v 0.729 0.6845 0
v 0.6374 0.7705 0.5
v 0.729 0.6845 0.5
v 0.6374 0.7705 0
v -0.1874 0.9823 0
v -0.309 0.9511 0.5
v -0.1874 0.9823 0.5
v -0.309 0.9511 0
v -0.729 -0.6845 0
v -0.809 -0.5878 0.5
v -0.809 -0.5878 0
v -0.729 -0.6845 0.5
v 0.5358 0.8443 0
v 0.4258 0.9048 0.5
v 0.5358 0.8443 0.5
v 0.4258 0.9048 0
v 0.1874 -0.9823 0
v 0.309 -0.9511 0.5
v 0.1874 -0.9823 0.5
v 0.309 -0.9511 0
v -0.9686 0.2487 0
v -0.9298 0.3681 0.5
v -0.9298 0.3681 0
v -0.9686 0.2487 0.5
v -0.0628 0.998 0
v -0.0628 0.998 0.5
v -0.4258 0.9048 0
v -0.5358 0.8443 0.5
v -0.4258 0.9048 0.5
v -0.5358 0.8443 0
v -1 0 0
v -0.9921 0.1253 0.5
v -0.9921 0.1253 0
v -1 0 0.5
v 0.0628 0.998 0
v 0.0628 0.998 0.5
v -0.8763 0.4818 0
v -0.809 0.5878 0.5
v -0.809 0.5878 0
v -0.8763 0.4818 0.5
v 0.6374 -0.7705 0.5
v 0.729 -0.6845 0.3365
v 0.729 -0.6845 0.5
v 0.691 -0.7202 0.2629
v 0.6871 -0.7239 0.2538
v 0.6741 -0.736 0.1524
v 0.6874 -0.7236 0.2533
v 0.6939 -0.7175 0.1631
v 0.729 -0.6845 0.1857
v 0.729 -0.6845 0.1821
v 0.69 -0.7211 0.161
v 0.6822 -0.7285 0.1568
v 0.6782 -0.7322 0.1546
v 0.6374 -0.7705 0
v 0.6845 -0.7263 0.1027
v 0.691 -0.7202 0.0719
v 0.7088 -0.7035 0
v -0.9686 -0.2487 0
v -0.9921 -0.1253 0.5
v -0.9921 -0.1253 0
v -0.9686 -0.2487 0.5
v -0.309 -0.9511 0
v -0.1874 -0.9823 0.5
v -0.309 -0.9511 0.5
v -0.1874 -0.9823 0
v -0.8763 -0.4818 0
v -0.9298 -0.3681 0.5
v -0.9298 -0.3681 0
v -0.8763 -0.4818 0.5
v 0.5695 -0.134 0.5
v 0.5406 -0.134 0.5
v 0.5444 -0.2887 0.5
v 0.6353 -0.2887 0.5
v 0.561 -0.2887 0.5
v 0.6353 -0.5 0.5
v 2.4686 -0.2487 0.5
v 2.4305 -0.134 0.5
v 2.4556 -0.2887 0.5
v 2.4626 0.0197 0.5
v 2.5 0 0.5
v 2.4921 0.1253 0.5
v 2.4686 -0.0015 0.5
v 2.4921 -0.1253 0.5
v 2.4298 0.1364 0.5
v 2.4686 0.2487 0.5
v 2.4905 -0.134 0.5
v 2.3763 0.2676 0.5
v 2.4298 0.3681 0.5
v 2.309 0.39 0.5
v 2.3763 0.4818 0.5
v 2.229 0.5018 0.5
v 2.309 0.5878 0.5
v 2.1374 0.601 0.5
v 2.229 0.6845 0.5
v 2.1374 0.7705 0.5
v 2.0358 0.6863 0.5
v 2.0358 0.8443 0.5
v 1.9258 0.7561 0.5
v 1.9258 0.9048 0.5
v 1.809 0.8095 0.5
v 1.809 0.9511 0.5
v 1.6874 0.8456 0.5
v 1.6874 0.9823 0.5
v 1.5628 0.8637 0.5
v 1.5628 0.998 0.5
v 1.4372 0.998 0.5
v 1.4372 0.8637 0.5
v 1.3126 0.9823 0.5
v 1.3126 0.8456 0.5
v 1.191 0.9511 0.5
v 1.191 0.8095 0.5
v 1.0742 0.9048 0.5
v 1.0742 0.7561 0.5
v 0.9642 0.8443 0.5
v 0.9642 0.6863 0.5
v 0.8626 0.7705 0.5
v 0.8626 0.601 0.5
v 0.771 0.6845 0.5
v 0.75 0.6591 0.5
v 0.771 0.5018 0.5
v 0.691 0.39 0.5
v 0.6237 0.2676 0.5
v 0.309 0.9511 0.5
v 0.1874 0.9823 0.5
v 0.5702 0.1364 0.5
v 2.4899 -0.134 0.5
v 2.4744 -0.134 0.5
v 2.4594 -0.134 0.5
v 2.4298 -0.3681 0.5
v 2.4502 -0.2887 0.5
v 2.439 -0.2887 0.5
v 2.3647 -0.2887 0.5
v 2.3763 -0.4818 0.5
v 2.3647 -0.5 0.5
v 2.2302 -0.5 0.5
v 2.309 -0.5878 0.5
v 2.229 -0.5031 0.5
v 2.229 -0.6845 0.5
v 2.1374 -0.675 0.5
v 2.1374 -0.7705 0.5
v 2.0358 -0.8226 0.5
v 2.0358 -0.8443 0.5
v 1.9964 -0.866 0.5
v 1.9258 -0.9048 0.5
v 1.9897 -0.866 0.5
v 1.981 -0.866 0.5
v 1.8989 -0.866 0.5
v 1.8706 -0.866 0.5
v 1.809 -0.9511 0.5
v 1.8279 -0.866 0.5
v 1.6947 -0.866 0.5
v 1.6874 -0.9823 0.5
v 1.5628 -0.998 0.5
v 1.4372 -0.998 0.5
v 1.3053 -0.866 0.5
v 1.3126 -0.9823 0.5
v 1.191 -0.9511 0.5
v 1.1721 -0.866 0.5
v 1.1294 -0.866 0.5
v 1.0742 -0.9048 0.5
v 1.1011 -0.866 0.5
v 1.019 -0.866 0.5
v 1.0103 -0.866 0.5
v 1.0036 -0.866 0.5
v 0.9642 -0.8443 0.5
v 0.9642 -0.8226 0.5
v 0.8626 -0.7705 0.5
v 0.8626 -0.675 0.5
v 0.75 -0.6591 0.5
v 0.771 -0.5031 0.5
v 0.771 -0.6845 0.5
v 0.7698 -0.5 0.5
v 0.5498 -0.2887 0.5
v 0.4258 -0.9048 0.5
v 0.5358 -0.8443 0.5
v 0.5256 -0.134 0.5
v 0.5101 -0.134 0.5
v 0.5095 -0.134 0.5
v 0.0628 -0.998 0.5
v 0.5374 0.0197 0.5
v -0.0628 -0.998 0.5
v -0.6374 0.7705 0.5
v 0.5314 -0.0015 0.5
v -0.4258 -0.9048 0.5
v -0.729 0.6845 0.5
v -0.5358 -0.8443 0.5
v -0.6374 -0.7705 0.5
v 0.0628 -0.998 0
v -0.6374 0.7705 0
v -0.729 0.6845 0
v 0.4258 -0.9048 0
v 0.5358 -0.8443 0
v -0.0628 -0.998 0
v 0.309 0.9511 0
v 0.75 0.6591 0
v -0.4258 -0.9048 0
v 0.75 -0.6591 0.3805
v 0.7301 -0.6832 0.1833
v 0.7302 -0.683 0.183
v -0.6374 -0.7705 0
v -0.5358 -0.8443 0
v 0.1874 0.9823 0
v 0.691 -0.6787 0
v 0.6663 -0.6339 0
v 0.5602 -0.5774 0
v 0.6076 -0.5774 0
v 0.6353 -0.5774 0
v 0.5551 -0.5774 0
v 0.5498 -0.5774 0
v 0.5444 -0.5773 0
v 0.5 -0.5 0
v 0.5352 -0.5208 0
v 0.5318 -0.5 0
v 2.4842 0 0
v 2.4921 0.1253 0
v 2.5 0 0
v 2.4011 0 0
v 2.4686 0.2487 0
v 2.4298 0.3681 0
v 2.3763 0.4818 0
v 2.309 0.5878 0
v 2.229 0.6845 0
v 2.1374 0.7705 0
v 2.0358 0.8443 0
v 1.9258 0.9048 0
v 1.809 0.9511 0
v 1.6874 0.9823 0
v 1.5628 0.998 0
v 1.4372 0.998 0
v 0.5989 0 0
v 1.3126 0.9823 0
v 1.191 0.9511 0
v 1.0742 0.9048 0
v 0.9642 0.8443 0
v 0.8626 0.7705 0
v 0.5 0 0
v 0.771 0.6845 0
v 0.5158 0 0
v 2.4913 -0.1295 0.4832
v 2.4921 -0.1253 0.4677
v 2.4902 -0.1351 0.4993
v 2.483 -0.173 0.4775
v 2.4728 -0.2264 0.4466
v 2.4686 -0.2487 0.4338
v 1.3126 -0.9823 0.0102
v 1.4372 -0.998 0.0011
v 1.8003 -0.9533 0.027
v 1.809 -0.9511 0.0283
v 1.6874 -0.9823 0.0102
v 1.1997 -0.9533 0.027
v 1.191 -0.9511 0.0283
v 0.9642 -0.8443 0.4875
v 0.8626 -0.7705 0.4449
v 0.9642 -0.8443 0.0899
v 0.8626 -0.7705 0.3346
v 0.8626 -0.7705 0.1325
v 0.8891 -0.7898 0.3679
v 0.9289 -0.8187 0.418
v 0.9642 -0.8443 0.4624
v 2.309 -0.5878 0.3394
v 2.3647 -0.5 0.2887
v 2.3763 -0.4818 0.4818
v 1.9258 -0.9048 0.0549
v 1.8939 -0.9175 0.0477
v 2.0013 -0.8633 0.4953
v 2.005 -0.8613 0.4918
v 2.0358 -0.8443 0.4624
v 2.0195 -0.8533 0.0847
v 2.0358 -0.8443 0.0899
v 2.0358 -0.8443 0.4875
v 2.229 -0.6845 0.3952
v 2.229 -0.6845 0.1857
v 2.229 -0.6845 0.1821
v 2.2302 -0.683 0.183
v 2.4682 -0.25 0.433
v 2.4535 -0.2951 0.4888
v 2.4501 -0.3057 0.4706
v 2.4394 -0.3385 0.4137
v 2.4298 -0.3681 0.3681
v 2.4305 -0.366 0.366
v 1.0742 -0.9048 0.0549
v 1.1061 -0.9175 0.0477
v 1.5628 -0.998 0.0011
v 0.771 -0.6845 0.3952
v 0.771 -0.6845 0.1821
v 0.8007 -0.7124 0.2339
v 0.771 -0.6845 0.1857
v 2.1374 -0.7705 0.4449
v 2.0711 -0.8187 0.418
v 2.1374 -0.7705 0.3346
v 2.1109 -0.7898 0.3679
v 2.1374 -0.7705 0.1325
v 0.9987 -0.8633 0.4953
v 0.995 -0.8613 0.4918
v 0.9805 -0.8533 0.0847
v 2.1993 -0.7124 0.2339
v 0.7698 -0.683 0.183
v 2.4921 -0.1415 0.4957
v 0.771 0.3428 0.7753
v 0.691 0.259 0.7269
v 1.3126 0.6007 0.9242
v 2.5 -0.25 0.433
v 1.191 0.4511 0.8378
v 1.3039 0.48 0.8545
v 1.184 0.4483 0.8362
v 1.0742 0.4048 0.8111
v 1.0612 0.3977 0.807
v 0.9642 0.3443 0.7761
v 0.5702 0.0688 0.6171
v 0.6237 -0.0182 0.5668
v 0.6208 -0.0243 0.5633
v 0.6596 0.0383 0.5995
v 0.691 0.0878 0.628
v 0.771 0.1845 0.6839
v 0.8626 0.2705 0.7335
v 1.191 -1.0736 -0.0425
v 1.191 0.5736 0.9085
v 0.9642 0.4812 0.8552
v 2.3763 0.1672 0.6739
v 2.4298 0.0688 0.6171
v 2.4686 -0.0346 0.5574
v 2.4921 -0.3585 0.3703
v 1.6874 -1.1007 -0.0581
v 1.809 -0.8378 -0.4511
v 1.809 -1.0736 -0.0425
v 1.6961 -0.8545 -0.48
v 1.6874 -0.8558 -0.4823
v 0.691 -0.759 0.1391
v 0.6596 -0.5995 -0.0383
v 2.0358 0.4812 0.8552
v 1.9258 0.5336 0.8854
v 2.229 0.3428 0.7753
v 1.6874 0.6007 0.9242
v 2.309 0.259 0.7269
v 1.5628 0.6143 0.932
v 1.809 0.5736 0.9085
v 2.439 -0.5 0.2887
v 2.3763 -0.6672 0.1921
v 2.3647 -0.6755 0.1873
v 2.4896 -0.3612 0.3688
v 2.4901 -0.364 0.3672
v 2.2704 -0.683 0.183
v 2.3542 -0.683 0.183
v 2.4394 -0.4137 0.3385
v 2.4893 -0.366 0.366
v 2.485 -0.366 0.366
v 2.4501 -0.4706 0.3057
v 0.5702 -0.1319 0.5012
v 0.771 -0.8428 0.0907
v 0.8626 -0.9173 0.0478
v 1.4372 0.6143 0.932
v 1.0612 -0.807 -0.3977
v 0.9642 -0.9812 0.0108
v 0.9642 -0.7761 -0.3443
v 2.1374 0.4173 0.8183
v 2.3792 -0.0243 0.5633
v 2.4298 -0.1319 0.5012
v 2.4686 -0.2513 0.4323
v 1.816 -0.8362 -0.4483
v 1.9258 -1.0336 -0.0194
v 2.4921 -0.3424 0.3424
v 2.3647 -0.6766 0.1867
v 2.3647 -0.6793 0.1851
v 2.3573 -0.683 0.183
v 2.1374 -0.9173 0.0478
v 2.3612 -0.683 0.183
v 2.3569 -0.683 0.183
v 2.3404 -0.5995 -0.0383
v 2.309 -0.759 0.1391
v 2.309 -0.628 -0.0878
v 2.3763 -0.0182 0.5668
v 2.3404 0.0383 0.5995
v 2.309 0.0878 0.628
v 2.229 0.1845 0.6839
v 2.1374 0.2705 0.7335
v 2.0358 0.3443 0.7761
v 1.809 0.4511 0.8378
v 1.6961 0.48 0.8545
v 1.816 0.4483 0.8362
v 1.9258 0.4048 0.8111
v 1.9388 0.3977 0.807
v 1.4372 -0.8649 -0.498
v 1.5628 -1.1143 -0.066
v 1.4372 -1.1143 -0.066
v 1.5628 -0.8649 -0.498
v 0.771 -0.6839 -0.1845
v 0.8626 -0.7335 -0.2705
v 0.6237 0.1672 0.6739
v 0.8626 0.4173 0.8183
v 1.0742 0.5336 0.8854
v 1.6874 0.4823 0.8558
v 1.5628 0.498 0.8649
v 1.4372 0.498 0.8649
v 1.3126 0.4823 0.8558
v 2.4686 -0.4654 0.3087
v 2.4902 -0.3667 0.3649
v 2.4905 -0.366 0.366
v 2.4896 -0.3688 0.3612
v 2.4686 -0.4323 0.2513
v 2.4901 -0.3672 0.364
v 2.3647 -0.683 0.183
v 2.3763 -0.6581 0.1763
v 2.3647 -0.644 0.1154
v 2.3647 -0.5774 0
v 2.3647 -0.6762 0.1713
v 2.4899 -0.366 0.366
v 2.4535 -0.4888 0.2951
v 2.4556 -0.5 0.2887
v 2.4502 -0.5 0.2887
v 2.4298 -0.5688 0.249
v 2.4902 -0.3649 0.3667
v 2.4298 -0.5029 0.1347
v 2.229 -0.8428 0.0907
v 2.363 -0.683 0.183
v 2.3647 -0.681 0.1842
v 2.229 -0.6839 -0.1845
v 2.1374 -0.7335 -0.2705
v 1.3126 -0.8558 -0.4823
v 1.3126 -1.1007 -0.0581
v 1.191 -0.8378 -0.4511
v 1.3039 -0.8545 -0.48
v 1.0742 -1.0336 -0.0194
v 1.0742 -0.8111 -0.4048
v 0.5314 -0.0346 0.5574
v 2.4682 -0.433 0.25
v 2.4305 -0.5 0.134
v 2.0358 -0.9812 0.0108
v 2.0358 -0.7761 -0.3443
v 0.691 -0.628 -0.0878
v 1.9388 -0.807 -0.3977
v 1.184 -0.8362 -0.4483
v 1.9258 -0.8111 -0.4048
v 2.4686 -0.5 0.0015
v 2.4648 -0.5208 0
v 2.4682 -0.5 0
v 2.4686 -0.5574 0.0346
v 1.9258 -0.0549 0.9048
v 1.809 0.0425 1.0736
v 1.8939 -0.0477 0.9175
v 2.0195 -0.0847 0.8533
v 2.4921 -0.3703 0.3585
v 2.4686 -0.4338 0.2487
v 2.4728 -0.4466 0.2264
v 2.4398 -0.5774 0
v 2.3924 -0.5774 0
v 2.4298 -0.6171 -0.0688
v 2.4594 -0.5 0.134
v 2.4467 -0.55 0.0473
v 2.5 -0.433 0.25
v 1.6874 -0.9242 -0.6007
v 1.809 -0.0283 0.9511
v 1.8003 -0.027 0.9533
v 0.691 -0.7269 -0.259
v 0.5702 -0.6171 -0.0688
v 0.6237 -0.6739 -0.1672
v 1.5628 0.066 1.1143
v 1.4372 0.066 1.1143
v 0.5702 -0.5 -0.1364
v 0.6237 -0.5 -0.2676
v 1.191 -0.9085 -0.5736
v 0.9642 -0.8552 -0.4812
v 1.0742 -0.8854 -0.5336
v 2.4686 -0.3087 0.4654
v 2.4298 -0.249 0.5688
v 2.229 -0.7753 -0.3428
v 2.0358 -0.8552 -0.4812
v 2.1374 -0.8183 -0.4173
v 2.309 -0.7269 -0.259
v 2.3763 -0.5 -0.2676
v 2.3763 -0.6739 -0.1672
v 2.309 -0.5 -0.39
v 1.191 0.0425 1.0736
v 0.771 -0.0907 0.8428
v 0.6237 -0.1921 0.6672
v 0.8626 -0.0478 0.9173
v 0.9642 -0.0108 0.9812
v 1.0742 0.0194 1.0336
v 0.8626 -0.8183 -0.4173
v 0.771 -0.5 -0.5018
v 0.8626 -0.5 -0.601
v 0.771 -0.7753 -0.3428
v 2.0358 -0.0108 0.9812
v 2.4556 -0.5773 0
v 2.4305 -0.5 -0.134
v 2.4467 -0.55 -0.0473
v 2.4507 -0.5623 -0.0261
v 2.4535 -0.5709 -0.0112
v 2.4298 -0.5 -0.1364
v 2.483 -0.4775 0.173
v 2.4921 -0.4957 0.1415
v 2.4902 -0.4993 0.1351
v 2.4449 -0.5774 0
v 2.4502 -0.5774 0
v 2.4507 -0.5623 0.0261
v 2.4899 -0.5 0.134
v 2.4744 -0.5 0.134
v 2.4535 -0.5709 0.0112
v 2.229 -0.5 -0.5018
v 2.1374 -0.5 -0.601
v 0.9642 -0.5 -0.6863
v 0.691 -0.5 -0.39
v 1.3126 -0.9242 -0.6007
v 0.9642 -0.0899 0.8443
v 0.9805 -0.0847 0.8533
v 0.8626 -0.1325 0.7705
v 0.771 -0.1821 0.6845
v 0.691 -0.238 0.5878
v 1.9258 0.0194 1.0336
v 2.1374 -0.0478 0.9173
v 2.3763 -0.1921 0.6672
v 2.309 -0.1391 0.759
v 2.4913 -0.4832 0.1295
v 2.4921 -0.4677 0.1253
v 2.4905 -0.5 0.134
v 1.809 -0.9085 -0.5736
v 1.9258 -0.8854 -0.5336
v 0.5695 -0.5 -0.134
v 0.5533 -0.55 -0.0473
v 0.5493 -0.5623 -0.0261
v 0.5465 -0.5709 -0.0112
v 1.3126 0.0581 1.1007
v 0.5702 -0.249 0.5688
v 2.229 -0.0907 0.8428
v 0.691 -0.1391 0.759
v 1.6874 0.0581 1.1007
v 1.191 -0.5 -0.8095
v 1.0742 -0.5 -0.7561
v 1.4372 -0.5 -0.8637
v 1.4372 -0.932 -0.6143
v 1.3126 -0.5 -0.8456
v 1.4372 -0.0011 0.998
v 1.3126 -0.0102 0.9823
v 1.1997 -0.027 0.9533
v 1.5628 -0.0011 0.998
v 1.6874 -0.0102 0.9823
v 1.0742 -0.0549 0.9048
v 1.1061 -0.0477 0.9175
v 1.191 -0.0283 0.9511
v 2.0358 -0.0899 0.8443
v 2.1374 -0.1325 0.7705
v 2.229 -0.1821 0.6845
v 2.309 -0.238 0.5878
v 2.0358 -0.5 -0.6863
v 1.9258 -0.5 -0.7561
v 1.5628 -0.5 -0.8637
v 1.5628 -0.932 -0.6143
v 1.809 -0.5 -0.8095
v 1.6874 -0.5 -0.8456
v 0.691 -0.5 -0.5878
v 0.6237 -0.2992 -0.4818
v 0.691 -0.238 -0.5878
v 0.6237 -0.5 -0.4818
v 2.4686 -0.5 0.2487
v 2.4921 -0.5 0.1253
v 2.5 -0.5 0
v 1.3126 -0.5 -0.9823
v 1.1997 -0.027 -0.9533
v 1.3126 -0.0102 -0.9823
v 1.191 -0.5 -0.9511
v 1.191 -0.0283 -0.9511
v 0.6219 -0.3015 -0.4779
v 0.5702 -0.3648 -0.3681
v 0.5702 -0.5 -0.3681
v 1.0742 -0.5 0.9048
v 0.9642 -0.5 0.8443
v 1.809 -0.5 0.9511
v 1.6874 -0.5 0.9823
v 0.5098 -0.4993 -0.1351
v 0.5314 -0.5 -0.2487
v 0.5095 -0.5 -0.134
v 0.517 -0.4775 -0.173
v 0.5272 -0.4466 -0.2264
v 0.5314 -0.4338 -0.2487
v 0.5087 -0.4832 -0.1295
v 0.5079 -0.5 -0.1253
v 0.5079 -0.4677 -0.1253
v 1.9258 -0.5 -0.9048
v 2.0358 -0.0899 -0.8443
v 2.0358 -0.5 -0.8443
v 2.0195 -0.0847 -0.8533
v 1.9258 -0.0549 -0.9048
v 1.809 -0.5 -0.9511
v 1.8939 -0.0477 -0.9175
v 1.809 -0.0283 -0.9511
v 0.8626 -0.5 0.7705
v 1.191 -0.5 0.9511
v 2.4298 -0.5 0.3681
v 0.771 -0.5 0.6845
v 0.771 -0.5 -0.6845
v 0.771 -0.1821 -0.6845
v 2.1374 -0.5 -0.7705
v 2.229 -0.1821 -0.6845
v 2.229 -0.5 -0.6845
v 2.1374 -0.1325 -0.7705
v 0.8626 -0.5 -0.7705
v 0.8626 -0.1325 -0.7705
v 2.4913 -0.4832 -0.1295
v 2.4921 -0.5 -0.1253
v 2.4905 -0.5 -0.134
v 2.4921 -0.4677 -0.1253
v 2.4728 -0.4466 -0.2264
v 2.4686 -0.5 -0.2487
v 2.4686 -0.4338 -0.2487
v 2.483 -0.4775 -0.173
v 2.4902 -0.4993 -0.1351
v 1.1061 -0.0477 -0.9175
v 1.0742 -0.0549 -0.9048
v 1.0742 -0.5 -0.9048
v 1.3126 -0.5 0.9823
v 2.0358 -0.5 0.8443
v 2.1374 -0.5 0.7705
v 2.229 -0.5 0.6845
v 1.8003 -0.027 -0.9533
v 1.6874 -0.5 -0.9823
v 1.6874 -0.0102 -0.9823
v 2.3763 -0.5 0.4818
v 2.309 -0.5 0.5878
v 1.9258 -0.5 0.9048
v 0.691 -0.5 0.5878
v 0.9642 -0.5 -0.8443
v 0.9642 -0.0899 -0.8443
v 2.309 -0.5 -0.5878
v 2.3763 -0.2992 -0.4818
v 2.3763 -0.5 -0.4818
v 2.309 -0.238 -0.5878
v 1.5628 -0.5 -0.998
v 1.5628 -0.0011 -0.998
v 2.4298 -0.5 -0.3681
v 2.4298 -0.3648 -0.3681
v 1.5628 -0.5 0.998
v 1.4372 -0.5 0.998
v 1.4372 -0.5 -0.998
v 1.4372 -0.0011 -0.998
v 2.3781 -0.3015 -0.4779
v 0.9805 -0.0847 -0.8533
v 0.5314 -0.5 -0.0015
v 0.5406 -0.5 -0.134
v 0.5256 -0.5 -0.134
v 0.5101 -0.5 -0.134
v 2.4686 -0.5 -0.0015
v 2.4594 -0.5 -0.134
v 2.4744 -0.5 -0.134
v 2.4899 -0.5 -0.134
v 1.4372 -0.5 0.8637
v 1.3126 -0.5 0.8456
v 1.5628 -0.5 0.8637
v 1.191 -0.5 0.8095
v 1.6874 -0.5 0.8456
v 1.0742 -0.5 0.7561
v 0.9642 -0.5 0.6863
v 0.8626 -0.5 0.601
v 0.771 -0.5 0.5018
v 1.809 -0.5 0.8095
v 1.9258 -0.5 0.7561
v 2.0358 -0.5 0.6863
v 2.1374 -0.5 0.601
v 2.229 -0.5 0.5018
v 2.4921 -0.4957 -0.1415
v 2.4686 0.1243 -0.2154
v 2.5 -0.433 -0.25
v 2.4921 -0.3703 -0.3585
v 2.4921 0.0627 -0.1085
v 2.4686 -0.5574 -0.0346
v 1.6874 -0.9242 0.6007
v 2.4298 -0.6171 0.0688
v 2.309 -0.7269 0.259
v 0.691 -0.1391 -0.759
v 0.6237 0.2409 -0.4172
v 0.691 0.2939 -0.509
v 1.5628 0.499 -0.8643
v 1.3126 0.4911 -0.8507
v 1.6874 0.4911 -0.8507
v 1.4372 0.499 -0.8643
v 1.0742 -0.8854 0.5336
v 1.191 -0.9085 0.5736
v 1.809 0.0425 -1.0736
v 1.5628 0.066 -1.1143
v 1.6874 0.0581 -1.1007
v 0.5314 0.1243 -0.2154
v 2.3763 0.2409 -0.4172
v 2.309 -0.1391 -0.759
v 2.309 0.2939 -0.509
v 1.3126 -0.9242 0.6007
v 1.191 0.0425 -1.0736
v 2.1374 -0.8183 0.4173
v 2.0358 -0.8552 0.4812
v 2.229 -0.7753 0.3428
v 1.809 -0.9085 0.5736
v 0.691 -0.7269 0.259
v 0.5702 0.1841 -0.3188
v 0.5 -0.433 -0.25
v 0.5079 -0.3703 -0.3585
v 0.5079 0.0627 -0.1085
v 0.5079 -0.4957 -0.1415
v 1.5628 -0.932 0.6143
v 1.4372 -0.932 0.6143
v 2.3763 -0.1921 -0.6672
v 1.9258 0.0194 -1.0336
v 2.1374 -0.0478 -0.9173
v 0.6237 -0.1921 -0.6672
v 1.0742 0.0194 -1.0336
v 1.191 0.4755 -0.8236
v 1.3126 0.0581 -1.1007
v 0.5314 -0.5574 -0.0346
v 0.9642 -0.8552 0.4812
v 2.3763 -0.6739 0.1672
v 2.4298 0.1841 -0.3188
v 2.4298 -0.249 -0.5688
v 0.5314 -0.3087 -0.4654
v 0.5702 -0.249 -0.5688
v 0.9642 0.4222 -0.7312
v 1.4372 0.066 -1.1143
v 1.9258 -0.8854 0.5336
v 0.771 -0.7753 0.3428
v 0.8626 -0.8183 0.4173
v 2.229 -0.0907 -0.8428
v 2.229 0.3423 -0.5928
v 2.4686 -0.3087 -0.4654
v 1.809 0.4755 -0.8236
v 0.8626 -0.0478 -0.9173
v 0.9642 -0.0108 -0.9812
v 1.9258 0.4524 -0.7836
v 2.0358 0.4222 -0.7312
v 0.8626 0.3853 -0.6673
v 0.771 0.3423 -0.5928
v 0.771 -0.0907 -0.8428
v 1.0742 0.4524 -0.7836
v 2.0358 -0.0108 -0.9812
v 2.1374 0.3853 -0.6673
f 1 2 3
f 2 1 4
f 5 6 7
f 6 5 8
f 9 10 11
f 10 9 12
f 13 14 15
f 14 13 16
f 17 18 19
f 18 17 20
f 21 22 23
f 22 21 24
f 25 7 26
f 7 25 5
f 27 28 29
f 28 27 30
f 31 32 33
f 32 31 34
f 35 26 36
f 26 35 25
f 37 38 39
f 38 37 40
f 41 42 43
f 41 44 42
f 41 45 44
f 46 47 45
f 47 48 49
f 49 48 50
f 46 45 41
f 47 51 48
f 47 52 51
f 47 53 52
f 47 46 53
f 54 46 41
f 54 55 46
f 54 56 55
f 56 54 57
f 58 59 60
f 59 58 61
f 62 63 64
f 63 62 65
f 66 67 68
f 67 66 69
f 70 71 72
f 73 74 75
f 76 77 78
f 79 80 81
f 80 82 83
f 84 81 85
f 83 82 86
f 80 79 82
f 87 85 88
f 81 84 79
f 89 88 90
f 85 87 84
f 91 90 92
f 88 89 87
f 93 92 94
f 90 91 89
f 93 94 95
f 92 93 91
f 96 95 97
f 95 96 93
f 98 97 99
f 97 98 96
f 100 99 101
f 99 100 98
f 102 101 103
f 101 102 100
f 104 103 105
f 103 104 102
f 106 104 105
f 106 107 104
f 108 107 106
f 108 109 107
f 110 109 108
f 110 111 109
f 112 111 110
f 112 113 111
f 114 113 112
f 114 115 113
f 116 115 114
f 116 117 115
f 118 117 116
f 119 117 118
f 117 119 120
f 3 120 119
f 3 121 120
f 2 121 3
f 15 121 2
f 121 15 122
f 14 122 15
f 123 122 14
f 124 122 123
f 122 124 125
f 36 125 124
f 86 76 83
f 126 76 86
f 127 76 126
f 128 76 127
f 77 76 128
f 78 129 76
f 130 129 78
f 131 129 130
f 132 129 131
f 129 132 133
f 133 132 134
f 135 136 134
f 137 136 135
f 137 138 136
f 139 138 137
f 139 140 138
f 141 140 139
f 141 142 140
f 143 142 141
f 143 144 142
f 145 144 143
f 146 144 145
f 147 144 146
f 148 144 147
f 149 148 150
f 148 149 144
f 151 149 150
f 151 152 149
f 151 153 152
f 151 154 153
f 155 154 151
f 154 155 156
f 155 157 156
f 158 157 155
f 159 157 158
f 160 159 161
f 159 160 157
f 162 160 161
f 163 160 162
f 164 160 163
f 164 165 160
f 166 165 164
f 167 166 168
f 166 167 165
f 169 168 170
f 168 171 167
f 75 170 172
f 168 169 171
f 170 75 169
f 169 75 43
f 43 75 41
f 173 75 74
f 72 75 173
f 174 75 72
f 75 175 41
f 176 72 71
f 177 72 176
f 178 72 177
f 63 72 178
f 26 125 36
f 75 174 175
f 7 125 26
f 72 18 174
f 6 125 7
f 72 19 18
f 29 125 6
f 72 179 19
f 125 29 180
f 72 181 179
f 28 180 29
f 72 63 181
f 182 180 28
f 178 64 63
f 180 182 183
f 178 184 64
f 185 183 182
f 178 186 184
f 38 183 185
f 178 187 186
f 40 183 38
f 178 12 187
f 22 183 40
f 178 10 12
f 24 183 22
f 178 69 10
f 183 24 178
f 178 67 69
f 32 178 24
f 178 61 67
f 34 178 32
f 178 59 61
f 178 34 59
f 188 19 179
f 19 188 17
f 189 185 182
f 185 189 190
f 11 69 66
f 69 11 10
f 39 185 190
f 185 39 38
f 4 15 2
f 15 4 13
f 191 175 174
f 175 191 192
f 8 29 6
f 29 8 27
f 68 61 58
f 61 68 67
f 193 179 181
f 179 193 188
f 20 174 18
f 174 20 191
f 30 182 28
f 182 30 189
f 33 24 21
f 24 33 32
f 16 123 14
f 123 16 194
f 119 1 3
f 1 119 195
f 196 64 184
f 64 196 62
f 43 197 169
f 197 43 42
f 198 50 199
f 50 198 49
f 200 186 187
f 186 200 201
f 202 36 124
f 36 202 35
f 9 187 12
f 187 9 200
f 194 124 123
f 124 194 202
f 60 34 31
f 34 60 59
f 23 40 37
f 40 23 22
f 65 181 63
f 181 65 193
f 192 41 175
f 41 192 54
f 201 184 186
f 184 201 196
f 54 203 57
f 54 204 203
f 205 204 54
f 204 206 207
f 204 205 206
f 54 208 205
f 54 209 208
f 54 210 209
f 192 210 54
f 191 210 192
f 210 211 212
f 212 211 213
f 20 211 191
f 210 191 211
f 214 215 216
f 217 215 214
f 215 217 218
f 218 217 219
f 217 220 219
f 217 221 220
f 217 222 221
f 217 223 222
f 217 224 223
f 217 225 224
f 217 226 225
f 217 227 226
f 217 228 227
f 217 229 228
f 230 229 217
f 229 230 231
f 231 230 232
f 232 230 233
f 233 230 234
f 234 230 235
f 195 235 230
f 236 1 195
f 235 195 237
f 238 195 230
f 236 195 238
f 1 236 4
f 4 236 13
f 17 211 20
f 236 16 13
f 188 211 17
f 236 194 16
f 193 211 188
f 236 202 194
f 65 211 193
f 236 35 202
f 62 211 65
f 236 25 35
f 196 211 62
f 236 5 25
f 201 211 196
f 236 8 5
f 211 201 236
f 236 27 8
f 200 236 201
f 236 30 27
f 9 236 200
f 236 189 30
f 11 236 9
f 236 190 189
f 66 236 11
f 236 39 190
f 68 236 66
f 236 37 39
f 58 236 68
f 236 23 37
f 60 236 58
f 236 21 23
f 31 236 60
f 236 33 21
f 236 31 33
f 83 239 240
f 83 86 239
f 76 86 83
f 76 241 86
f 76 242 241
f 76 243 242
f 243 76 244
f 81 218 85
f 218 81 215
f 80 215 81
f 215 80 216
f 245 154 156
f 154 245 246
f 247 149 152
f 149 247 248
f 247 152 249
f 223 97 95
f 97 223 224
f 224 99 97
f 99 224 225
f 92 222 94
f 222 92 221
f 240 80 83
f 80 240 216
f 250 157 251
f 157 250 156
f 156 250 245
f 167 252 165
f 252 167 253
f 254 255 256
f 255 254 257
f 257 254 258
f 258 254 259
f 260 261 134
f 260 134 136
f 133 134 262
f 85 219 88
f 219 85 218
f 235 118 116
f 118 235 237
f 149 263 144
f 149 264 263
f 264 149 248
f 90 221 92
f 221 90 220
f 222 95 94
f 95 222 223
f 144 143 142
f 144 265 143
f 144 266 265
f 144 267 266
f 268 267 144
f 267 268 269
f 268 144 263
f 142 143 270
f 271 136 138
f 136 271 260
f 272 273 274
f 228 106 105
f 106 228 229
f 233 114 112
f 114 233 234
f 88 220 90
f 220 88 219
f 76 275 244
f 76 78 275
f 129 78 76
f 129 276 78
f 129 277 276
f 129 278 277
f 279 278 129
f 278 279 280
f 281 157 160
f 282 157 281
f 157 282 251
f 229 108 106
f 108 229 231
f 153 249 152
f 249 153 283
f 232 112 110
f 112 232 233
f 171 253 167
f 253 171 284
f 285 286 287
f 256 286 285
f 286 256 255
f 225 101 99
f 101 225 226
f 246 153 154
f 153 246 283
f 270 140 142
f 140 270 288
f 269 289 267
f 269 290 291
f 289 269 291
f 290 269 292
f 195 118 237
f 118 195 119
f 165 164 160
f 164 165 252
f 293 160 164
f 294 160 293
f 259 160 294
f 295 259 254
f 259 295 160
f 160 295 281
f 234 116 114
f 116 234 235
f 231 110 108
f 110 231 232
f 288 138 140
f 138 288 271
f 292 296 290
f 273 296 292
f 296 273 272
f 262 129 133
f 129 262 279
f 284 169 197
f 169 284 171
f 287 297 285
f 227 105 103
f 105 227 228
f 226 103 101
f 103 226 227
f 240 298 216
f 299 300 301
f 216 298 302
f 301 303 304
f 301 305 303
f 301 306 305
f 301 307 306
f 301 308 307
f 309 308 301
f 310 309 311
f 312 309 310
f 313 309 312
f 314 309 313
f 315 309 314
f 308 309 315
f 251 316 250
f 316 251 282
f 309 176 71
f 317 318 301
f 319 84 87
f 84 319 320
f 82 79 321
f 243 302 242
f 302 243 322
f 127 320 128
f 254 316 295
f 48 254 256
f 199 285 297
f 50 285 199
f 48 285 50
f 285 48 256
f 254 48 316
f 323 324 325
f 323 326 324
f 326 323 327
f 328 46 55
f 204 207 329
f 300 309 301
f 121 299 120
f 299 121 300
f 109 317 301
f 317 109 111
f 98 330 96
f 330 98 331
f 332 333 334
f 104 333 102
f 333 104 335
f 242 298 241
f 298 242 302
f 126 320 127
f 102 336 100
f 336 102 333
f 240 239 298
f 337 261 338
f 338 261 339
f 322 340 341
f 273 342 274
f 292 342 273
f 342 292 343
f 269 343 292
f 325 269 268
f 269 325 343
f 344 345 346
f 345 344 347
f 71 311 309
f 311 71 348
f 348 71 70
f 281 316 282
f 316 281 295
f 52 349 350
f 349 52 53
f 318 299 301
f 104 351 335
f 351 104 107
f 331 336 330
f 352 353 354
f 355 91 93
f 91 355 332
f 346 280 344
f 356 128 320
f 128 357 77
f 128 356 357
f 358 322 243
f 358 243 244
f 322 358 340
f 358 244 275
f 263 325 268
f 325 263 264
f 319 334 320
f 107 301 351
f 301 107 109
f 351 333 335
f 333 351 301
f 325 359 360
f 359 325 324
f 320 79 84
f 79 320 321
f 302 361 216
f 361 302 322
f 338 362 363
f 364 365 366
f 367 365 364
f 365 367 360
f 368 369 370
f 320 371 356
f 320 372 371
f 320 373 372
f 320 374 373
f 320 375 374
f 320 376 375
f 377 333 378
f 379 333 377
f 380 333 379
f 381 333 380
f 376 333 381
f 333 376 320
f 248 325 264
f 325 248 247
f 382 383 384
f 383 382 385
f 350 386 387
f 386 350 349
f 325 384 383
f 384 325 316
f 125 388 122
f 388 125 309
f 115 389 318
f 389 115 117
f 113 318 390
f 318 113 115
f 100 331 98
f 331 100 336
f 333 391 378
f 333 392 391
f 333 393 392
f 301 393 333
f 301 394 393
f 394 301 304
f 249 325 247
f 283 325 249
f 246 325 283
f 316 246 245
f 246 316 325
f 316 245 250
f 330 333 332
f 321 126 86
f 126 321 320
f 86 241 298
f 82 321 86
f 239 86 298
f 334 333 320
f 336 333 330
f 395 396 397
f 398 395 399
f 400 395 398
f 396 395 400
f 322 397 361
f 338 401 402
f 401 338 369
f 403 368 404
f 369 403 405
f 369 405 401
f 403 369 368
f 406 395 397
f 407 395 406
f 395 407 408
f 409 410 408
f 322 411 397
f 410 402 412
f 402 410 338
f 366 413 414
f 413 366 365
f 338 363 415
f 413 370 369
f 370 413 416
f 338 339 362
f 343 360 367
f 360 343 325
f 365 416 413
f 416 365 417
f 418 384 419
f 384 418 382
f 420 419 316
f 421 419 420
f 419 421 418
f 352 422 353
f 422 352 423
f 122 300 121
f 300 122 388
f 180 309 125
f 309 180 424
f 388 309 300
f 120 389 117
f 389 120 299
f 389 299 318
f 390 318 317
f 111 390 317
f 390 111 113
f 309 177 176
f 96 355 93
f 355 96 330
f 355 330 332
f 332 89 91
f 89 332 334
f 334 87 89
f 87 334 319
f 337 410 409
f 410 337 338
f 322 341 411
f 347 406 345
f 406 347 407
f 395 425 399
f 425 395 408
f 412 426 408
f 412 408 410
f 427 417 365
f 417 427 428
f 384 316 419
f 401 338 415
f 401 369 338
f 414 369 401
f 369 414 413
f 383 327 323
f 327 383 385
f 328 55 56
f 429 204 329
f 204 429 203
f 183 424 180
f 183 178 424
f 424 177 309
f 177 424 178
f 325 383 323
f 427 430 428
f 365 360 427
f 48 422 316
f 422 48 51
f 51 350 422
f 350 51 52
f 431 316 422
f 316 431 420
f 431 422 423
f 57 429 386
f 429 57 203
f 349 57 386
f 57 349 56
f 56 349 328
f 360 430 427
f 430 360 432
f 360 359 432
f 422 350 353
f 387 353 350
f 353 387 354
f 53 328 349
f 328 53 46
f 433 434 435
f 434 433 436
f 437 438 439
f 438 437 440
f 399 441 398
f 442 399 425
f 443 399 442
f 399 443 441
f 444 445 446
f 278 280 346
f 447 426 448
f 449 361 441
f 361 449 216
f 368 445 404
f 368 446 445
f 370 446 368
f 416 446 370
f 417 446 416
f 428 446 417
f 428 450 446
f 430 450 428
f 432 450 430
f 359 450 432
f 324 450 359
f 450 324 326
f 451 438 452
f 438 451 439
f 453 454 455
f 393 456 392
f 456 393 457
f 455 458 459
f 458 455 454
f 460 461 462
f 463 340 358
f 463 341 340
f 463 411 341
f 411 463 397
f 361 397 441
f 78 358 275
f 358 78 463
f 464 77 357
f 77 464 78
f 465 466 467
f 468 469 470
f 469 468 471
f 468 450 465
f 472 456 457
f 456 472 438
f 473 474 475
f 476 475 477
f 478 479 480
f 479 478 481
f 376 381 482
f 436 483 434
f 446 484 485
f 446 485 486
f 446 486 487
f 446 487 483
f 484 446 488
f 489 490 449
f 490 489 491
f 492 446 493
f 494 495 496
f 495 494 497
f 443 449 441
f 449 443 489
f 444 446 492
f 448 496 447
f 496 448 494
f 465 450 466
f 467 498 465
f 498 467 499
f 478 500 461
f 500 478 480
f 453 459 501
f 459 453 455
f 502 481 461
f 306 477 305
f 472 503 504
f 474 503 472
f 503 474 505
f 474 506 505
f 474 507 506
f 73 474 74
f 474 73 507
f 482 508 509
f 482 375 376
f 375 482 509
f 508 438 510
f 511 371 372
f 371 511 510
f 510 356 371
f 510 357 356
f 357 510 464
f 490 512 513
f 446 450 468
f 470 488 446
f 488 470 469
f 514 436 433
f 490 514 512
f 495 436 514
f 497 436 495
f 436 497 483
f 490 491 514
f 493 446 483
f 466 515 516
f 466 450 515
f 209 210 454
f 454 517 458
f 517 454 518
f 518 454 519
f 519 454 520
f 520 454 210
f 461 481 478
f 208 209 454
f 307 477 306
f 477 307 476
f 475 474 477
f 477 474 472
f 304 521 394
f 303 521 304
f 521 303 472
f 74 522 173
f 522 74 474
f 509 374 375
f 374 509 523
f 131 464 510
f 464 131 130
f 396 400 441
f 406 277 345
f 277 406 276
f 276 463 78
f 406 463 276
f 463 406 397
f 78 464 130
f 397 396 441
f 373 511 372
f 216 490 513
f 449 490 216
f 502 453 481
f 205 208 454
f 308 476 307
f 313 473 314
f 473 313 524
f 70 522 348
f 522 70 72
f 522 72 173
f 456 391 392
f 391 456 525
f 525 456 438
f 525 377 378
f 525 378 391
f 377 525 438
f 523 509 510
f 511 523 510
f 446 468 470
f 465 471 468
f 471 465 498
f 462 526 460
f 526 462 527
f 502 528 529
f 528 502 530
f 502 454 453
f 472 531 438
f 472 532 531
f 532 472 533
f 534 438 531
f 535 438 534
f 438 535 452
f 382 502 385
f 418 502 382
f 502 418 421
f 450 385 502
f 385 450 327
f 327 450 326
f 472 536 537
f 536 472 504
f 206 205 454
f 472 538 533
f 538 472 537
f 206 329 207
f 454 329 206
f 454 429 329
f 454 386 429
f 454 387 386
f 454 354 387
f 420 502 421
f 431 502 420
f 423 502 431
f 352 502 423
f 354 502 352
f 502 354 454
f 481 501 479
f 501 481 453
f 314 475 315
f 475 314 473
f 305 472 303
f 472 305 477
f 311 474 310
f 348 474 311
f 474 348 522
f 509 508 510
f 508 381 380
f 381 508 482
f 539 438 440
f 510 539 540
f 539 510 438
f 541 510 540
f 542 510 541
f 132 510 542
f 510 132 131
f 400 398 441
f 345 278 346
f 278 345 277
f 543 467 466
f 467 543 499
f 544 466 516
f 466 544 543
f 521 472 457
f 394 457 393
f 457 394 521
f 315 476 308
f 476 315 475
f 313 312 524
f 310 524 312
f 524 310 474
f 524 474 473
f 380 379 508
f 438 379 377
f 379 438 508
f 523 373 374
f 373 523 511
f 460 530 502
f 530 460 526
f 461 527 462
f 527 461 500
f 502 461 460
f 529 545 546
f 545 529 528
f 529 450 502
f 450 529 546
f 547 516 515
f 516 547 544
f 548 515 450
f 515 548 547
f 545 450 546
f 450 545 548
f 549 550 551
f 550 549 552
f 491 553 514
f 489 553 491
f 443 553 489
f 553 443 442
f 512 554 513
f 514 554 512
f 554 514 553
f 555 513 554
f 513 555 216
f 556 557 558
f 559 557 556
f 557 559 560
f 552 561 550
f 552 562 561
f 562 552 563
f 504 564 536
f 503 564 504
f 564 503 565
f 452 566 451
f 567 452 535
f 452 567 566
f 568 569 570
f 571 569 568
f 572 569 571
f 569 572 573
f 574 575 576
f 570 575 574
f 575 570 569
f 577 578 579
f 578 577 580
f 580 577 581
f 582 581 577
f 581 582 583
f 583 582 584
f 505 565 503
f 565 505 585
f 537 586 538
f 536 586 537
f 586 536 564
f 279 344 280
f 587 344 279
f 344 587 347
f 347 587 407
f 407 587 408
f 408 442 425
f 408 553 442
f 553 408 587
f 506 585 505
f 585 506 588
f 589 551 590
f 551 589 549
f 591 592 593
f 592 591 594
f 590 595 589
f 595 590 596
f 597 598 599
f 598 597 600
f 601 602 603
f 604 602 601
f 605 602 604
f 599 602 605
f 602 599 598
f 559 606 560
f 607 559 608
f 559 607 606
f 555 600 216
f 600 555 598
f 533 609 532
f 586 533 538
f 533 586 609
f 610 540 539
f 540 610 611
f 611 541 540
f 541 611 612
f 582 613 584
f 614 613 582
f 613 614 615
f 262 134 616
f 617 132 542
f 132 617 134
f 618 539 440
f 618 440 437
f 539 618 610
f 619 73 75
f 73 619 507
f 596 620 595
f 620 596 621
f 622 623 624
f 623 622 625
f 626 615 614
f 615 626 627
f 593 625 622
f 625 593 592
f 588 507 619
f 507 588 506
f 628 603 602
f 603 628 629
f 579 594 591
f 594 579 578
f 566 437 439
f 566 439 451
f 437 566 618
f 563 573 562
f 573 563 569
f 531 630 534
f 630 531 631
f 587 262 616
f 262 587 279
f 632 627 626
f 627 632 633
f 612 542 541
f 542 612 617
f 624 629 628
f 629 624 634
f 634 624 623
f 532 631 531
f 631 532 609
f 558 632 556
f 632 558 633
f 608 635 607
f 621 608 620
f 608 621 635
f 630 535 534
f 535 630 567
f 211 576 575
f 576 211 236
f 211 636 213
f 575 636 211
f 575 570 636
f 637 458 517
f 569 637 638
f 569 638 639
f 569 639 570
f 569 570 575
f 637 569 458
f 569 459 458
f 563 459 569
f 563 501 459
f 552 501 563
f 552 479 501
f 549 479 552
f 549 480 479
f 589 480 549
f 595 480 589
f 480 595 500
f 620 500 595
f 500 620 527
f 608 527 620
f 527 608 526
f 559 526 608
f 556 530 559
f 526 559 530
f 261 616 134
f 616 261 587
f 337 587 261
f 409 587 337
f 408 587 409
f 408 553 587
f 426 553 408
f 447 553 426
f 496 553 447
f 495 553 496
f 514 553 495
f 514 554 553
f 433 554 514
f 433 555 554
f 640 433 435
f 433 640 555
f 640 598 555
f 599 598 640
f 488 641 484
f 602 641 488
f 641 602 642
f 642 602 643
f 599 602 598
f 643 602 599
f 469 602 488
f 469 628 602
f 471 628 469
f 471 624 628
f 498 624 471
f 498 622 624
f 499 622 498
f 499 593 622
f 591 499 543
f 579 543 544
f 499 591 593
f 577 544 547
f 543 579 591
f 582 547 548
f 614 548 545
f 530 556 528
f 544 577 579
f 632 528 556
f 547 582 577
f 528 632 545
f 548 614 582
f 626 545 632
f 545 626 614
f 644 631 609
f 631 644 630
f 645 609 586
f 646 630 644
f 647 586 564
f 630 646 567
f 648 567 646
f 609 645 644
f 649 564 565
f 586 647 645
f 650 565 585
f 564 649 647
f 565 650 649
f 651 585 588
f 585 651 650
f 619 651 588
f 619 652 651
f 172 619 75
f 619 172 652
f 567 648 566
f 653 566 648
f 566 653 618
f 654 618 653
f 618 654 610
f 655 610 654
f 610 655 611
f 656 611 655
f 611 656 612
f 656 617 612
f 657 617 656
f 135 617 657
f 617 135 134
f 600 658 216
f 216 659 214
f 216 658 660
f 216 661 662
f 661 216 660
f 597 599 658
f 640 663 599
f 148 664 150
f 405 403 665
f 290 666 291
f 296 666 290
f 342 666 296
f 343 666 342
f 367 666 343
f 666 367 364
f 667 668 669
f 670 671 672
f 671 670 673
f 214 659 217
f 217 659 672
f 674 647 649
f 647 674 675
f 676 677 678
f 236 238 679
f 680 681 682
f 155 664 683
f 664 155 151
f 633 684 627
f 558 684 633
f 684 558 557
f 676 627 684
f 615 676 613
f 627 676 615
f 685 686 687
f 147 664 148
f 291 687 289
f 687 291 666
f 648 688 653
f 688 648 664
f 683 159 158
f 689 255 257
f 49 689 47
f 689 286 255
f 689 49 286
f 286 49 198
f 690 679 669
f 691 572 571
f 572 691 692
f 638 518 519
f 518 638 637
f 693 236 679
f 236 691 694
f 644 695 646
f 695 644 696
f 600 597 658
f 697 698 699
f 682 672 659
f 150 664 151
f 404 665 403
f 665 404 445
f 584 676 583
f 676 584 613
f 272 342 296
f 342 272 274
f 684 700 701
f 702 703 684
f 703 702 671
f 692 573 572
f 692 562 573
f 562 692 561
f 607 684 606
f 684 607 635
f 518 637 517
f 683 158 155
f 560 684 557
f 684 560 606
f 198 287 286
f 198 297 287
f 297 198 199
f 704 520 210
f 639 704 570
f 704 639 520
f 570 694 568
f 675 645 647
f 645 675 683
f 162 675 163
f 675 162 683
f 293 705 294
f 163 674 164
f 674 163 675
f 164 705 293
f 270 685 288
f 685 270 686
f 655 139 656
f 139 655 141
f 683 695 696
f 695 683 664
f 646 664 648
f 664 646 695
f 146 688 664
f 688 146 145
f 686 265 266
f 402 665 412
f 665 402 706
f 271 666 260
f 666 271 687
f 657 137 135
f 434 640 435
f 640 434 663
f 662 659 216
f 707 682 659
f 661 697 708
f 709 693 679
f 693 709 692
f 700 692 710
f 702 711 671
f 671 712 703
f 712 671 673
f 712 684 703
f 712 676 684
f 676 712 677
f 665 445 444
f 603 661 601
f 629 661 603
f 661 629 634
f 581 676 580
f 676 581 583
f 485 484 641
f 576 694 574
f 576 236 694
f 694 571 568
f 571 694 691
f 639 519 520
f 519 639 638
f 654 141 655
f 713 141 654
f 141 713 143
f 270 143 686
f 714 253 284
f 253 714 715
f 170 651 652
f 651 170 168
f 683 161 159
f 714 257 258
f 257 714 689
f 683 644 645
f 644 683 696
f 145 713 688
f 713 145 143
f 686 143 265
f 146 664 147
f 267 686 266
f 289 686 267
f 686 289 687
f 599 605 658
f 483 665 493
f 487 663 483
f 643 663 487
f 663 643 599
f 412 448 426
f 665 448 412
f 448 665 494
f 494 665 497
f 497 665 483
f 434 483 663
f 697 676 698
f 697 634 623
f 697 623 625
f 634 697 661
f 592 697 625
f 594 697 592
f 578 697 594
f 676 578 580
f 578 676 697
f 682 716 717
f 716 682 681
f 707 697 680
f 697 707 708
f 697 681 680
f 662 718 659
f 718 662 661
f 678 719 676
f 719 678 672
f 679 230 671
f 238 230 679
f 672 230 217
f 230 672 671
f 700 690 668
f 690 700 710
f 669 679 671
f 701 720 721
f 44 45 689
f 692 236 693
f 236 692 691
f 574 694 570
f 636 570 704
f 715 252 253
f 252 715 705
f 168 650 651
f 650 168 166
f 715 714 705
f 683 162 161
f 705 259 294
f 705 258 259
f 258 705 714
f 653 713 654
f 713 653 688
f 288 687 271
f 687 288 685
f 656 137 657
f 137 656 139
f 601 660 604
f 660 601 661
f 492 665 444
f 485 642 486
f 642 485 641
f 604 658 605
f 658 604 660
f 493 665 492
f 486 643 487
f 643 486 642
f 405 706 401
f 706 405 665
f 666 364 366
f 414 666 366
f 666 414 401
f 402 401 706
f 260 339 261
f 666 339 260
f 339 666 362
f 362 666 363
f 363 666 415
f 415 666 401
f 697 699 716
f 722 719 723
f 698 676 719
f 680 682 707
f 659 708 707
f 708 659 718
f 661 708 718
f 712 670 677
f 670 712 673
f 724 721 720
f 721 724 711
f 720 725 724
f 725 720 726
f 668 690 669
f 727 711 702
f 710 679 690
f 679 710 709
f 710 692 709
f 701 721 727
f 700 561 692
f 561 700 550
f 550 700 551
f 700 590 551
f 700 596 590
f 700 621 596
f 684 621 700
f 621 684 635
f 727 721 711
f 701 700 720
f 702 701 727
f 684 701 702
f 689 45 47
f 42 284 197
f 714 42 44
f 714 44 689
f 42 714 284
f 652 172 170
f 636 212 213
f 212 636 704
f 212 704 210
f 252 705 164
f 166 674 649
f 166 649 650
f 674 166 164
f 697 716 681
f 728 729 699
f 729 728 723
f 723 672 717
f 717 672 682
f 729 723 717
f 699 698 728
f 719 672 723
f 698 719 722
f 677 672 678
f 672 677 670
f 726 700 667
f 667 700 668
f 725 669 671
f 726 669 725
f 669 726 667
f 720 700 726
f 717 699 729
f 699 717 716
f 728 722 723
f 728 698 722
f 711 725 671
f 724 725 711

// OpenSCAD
// Generated by SolidPython 1.1.1 on 2021-11-15 13:40:18
$fn = 50;


union() {
	cylinder(h = 0.5000000000, r = 1);
	rotate(a = [0, 0, 0]) {
		translate(v = [1.5000000000, 0, 0]) {
			cylinder(h = 0.5000000000, r = 1);
		}
	}
	rotate(a = [30, 0, 0]) {
		translate(v = [1.5000000000, 0, 0]) {
			cylinder(h = 0.5000000000, r = 1);
		}
	}
	rotate(a = [60, 0, 0]) {
		translate(v = [1.5000000000, 0, 0]) {
			cylinder(h = 0.5000000000, r = 1);
		}
	}
	rotate(a = [90, 0, 0]) {
		translate(v = [1.5000000000, 0, 0]) {
			cylinder(h = 0.5000000000, r = 1);
		}
	}
	rotate(a = [120, 0, 0]) {
		translate(v = [1.5000000000, 0, 0]) {
			cylinder(h = 0.5000000000, r = 1);
		}
	}
}
/***********************************************
*********      SolidPython code:      **********
************************************************
 
# SolidPython example code 
# Brygg Ullmer, Clemson University
# Written 2021-10-28

from solid import *        # load in SolidPython/SCAD support code

c1 = cylinder(r=1, h=.5)
outGeom = c1

c2 = translate([1.5,0,0])(c1)

numF = 5
rot  = 0; rotIncr = 30

for i in range(numF):
  c3 = rotate([rot,0,0])(c2)
  outGeom += c3; rot += rotIncr

radialSegments = 50; hdr = '$fn = %s;' % radialSegments # create a header for the export
scad_render_to_file(outGeom, 'exTg02.scad', file_header=hdr) # write the .scad file

### end ###

 
 
************************************************/
